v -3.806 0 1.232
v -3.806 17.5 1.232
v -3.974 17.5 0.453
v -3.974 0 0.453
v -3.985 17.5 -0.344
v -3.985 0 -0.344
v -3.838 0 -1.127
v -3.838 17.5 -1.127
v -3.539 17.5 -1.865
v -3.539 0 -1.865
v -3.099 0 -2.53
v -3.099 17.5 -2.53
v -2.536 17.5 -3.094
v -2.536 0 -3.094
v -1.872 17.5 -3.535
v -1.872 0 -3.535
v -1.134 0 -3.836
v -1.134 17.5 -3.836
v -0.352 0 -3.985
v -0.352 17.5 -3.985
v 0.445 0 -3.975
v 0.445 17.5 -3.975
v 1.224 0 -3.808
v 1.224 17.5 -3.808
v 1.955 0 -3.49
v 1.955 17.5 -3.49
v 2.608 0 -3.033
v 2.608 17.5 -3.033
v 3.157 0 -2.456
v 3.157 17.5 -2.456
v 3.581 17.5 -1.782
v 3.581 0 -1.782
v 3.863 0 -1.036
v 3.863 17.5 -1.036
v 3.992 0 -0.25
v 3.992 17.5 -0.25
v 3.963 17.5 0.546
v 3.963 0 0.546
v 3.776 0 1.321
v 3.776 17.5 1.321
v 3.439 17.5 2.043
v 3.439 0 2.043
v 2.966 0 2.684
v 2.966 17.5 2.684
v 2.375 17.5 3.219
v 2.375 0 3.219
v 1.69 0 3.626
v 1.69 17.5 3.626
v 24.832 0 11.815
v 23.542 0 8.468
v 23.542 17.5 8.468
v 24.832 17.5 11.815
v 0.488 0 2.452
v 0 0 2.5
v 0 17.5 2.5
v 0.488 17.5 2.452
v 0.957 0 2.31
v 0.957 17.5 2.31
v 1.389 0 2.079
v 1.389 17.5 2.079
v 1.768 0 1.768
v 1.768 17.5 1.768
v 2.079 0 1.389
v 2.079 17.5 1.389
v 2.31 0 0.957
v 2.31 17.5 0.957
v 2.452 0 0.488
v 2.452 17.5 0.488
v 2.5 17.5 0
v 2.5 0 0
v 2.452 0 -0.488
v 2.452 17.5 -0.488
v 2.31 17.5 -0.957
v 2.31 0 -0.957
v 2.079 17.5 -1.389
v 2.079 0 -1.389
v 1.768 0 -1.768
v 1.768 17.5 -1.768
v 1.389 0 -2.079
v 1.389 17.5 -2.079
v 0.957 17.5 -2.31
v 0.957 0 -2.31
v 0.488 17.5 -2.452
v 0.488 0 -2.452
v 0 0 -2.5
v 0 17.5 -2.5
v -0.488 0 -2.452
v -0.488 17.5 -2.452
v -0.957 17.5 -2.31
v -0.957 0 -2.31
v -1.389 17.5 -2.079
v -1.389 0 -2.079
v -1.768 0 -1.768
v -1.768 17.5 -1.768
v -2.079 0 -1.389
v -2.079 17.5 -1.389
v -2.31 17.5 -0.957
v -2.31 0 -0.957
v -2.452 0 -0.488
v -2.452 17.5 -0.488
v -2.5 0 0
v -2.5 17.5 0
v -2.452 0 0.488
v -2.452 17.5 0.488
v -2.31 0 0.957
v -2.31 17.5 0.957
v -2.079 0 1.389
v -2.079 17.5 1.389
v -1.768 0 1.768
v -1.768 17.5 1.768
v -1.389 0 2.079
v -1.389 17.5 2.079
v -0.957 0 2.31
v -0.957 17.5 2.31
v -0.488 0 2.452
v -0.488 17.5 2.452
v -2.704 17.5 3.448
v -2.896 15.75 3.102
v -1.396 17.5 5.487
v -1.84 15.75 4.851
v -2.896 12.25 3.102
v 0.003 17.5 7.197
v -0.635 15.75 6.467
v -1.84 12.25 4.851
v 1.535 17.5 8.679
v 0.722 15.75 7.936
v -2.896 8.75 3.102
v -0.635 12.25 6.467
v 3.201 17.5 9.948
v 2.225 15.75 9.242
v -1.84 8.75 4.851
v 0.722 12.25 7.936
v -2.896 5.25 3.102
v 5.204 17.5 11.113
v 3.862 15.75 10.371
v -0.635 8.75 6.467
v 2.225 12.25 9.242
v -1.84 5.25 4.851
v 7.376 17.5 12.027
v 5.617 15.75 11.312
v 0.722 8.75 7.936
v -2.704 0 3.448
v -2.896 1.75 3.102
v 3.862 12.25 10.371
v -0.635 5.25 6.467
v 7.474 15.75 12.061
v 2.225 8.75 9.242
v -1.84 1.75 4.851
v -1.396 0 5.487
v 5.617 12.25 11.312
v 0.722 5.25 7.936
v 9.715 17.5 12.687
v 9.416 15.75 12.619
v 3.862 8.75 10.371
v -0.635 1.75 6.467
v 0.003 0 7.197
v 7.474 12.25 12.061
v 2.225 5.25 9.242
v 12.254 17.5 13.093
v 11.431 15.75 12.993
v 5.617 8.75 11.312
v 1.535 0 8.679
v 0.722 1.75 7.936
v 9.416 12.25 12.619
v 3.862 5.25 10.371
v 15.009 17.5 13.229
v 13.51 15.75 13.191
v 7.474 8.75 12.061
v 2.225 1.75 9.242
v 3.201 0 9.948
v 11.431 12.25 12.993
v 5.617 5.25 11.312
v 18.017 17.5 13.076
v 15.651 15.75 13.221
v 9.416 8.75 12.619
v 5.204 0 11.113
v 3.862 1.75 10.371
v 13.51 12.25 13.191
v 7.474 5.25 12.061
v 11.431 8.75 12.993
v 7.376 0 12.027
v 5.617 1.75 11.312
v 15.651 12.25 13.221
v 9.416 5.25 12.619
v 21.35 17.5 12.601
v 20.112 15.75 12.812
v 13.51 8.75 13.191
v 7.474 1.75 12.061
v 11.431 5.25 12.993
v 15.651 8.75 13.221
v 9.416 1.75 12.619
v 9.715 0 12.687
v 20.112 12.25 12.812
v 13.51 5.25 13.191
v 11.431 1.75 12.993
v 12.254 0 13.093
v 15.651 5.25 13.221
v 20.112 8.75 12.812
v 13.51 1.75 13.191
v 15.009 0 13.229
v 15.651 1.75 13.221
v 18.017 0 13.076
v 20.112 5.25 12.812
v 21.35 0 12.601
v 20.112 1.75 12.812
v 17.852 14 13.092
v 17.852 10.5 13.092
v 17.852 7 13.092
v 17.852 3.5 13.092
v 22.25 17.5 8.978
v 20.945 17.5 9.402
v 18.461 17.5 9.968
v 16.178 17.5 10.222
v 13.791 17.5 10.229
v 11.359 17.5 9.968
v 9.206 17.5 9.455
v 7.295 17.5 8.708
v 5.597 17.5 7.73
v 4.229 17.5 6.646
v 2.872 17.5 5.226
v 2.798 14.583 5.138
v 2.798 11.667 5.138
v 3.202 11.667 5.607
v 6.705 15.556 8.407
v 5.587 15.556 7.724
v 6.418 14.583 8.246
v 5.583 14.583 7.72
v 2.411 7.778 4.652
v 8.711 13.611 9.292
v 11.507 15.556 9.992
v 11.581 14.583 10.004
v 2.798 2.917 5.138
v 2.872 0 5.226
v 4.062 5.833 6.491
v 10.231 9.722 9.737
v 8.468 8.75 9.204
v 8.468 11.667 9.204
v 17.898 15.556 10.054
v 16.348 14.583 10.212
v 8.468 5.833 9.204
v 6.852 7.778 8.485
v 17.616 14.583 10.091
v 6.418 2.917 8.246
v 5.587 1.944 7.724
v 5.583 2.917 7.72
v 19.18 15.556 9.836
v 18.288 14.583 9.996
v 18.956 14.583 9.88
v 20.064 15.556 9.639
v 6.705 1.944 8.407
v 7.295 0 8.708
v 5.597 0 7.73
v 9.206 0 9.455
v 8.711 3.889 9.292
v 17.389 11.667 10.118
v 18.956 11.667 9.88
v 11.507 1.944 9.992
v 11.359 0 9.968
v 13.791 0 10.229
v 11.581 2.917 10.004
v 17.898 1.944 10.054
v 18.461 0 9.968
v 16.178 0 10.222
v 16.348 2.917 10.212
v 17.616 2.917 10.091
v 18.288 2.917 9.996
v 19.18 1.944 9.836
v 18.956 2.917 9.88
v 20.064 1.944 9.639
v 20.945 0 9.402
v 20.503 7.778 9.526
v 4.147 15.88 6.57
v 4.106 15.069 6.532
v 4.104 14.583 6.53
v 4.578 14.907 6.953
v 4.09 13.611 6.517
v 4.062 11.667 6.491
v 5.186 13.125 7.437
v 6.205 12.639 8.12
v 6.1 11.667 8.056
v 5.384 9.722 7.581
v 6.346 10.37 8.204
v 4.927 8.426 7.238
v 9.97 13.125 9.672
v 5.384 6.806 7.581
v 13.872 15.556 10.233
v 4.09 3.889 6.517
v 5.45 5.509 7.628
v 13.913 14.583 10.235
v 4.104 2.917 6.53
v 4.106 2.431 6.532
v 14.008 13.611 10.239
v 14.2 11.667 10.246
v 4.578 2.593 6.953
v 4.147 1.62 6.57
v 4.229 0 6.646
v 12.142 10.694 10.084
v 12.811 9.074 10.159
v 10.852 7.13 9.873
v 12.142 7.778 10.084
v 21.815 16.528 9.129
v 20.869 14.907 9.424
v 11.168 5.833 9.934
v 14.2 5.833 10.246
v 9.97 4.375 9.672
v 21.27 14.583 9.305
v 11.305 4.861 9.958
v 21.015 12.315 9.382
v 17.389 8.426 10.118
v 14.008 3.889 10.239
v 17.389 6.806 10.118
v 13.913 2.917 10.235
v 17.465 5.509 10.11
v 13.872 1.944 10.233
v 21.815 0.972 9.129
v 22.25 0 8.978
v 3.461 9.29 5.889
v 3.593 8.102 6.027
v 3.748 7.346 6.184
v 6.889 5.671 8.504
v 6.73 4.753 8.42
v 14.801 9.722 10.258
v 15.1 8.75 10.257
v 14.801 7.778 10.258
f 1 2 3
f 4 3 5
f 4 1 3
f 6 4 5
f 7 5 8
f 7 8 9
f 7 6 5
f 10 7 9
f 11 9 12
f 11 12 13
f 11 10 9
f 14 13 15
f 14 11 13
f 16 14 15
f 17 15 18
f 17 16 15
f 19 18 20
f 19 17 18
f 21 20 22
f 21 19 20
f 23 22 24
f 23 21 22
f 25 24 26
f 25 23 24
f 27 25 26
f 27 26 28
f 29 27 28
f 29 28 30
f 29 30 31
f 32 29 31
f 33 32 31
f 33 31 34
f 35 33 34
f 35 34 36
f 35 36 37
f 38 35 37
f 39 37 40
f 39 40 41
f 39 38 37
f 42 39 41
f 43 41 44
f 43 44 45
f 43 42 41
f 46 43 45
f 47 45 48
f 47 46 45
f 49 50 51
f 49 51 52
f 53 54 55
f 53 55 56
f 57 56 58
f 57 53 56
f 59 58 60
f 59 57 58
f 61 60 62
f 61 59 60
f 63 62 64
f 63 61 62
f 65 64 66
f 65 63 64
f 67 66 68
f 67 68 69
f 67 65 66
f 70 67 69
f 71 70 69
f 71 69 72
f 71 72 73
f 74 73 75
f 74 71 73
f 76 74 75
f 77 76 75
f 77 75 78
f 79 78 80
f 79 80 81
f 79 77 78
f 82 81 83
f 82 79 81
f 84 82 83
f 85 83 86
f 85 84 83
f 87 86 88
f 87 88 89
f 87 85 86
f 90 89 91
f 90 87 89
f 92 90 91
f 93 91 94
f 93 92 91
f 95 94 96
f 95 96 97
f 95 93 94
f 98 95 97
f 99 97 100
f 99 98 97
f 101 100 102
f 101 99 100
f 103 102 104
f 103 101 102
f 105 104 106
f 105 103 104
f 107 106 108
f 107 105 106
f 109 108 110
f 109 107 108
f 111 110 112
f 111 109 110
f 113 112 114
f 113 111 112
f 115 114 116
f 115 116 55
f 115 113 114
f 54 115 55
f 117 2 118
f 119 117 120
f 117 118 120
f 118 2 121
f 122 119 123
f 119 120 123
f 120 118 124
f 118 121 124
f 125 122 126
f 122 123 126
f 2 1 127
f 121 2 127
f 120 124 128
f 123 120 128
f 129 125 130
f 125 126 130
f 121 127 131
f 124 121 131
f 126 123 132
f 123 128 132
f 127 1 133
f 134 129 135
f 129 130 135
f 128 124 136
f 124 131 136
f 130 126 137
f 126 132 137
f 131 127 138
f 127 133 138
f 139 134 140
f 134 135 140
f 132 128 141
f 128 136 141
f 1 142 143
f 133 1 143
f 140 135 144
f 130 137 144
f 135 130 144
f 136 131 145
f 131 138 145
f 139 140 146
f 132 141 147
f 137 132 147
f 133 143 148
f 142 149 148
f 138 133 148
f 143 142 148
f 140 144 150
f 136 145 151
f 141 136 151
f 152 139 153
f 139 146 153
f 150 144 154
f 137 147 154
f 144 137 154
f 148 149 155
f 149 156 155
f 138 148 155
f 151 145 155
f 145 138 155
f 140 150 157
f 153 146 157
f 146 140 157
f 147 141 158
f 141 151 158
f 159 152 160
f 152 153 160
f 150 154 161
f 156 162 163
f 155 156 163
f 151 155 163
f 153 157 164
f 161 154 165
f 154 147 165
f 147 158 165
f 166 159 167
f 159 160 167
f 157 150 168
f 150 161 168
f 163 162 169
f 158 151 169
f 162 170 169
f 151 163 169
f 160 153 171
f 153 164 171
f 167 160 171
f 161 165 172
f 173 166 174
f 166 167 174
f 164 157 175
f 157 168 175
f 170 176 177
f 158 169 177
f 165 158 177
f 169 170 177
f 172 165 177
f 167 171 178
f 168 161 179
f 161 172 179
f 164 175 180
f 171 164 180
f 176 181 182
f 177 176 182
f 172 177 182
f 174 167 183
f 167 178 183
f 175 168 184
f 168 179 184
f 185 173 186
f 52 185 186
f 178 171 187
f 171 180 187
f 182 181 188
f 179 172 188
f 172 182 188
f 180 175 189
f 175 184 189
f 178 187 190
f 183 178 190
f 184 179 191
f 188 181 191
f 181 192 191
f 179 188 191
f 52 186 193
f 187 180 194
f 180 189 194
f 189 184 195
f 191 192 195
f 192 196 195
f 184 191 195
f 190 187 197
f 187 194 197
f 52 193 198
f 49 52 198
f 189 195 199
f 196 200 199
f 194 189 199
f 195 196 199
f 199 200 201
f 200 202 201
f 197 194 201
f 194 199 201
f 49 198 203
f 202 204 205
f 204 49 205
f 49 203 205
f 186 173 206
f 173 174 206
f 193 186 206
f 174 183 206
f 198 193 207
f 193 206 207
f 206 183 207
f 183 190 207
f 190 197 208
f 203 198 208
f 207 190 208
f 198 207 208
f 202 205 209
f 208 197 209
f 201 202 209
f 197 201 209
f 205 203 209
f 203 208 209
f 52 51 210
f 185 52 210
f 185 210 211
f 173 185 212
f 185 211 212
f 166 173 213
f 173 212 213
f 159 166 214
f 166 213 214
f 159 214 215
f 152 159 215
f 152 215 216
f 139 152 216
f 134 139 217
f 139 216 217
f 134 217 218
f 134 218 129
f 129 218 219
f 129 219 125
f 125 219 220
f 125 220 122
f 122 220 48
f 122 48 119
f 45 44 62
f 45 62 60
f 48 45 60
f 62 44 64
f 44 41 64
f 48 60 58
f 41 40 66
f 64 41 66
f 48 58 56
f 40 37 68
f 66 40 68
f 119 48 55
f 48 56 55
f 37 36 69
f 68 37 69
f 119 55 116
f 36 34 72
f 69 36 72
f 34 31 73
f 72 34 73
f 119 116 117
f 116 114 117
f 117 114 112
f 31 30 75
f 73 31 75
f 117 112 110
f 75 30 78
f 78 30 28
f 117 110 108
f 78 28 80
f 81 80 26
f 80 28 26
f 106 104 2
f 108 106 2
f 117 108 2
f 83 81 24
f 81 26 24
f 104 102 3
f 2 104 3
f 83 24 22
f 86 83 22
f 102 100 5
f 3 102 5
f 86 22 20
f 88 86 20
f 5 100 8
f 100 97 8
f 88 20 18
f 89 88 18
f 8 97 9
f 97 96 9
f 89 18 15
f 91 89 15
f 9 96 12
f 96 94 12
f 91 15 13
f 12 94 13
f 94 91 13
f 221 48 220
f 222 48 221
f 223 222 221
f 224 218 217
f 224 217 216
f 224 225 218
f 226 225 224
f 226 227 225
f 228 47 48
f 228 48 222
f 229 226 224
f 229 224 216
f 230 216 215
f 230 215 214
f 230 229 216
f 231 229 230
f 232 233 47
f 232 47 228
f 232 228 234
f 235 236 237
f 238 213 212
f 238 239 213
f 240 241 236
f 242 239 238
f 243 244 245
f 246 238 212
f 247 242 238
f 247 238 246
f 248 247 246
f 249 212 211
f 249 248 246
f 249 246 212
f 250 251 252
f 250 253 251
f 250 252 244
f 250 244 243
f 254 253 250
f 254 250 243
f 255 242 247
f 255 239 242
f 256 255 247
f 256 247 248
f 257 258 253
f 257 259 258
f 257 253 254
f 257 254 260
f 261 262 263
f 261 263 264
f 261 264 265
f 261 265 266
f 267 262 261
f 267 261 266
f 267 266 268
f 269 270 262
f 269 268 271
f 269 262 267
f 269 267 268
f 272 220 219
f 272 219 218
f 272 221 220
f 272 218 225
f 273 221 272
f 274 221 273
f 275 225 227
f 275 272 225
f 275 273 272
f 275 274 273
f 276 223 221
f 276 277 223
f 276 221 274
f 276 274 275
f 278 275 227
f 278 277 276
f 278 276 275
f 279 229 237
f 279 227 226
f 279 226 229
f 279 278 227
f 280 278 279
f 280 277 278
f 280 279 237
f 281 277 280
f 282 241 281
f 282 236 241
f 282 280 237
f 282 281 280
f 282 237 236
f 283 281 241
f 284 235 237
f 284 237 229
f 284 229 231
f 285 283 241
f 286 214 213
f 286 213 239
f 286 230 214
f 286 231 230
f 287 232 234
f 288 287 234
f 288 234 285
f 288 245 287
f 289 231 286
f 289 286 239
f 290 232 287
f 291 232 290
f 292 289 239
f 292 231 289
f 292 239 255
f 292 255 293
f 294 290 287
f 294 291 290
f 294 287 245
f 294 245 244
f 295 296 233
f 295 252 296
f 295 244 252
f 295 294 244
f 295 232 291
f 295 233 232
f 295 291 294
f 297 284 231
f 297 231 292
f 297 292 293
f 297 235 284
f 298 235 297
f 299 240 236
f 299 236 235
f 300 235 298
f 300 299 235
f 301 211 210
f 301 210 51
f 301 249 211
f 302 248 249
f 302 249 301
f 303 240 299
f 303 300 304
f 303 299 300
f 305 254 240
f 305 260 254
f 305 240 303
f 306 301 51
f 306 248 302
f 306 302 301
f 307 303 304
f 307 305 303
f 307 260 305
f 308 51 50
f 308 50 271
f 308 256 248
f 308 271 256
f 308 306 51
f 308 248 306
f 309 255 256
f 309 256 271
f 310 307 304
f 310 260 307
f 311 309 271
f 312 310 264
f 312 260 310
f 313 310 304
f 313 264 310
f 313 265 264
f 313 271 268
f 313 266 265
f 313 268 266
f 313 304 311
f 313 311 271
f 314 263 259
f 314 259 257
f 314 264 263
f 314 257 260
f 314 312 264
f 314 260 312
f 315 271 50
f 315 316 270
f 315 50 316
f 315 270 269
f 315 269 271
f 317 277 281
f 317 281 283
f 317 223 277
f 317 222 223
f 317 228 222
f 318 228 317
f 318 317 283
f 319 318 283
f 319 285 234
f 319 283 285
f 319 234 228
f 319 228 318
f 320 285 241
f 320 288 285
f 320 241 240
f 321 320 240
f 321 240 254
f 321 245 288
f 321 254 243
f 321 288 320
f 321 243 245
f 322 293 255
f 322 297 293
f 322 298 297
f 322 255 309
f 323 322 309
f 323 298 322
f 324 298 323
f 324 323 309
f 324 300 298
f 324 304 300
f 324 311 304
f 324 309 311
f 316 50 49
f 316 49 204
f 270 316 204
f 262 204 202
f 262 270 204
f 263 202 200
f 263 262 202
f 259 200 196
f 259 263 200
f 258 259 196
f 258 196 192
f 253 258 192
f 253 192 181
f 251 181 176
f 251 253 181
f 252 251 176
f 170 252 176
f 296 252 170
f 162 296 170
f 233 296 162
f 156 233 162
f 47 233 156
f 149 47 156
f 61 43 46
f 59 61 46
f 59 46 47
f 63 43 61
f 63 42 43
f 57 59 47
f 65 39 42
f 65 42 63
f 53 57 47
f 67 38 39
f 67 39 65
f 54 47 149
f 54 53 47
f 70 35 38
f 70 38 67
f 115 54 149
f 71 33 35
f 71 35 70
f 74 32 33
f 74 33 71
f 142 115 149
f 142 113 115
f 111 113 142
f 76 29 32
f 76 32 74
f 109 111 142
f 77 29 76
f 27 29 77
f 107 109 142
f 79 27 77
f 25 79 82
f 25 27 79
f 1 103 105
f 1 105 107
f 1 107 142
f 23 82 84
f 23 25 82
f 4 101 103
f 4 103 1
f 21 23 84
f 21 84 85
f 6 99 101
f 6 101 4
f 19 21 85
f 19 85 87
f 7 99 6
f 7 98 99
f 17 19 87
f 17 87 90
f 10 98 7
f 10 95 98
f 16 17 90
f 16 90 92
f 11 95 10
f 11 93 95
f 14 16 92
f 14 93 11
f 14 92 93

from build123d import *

# Parameters (mm, degrees)
SKETCH1_R           = 2.5
BOSS_EXTRUDE1_DEPTH = 17.5


with BuildPart() as part:
    # Sketch1 → Boss-Extrude1 (new body)
    with BuildSketch(Plane(origin=(0, 0, 0), x_dir=(1, 0, 0), z_dir=(0, 1, 0))):
        with BuildLine():
            Line((23.541879595, -8.468455204), (24.8316558, -11.814901575))
            add(Edge.make_bspline(
                [(-3.805568845, -1.231927661), (-3.528946614, -1.867614728), (-2.918738419, -3.125576948), (-1.515087953, -5.45453999), (0.623426846, -8.045621597), (3.781873409, -10.498015789), (7.418729789, -12.189728632), (11.38983742, -13.110549791), (15.60959038, -13.326716755), (19.330752619, -12.977312299), (22.419560669, -12.410056853), (24.038619789, -12.023782628), (24.8316558, -11.814901575)],
                knots=[0, 0, 0, 0, 0.0625, 0.125, 0.25, 0.375, 0.5, 0.625, 0.75, 0.875, 0.9375, 1, 1, 1, 1], degree=3))
            ThreePointArc((-3.805568845, -1.231927661), (1.597426024, 3.667182856), (1.689614598, -3.625631326))
            add(Edge.make_bspline(
                [(1.689614598, -3.625631326), (2.720324256, -5.218487164), (7.805226841, -10.039422802), (19.040924986, -10.402845427), (23.541879595, -8.468455204)],
                knots=[0.175056288, 0.175056288, 0.175056288, 0.314867668, 0.704791976, 1, 1, 1], degree=2))
        make_face()
        with Locations(Location((0, 0, 0), (0, 0, 270))):
            Circle(SKETCH1_R, mode=Mode.SUBTRACT)
    extrude(amount=BOSS_EXTRUDE1_DEPTH)


solid = part.part
